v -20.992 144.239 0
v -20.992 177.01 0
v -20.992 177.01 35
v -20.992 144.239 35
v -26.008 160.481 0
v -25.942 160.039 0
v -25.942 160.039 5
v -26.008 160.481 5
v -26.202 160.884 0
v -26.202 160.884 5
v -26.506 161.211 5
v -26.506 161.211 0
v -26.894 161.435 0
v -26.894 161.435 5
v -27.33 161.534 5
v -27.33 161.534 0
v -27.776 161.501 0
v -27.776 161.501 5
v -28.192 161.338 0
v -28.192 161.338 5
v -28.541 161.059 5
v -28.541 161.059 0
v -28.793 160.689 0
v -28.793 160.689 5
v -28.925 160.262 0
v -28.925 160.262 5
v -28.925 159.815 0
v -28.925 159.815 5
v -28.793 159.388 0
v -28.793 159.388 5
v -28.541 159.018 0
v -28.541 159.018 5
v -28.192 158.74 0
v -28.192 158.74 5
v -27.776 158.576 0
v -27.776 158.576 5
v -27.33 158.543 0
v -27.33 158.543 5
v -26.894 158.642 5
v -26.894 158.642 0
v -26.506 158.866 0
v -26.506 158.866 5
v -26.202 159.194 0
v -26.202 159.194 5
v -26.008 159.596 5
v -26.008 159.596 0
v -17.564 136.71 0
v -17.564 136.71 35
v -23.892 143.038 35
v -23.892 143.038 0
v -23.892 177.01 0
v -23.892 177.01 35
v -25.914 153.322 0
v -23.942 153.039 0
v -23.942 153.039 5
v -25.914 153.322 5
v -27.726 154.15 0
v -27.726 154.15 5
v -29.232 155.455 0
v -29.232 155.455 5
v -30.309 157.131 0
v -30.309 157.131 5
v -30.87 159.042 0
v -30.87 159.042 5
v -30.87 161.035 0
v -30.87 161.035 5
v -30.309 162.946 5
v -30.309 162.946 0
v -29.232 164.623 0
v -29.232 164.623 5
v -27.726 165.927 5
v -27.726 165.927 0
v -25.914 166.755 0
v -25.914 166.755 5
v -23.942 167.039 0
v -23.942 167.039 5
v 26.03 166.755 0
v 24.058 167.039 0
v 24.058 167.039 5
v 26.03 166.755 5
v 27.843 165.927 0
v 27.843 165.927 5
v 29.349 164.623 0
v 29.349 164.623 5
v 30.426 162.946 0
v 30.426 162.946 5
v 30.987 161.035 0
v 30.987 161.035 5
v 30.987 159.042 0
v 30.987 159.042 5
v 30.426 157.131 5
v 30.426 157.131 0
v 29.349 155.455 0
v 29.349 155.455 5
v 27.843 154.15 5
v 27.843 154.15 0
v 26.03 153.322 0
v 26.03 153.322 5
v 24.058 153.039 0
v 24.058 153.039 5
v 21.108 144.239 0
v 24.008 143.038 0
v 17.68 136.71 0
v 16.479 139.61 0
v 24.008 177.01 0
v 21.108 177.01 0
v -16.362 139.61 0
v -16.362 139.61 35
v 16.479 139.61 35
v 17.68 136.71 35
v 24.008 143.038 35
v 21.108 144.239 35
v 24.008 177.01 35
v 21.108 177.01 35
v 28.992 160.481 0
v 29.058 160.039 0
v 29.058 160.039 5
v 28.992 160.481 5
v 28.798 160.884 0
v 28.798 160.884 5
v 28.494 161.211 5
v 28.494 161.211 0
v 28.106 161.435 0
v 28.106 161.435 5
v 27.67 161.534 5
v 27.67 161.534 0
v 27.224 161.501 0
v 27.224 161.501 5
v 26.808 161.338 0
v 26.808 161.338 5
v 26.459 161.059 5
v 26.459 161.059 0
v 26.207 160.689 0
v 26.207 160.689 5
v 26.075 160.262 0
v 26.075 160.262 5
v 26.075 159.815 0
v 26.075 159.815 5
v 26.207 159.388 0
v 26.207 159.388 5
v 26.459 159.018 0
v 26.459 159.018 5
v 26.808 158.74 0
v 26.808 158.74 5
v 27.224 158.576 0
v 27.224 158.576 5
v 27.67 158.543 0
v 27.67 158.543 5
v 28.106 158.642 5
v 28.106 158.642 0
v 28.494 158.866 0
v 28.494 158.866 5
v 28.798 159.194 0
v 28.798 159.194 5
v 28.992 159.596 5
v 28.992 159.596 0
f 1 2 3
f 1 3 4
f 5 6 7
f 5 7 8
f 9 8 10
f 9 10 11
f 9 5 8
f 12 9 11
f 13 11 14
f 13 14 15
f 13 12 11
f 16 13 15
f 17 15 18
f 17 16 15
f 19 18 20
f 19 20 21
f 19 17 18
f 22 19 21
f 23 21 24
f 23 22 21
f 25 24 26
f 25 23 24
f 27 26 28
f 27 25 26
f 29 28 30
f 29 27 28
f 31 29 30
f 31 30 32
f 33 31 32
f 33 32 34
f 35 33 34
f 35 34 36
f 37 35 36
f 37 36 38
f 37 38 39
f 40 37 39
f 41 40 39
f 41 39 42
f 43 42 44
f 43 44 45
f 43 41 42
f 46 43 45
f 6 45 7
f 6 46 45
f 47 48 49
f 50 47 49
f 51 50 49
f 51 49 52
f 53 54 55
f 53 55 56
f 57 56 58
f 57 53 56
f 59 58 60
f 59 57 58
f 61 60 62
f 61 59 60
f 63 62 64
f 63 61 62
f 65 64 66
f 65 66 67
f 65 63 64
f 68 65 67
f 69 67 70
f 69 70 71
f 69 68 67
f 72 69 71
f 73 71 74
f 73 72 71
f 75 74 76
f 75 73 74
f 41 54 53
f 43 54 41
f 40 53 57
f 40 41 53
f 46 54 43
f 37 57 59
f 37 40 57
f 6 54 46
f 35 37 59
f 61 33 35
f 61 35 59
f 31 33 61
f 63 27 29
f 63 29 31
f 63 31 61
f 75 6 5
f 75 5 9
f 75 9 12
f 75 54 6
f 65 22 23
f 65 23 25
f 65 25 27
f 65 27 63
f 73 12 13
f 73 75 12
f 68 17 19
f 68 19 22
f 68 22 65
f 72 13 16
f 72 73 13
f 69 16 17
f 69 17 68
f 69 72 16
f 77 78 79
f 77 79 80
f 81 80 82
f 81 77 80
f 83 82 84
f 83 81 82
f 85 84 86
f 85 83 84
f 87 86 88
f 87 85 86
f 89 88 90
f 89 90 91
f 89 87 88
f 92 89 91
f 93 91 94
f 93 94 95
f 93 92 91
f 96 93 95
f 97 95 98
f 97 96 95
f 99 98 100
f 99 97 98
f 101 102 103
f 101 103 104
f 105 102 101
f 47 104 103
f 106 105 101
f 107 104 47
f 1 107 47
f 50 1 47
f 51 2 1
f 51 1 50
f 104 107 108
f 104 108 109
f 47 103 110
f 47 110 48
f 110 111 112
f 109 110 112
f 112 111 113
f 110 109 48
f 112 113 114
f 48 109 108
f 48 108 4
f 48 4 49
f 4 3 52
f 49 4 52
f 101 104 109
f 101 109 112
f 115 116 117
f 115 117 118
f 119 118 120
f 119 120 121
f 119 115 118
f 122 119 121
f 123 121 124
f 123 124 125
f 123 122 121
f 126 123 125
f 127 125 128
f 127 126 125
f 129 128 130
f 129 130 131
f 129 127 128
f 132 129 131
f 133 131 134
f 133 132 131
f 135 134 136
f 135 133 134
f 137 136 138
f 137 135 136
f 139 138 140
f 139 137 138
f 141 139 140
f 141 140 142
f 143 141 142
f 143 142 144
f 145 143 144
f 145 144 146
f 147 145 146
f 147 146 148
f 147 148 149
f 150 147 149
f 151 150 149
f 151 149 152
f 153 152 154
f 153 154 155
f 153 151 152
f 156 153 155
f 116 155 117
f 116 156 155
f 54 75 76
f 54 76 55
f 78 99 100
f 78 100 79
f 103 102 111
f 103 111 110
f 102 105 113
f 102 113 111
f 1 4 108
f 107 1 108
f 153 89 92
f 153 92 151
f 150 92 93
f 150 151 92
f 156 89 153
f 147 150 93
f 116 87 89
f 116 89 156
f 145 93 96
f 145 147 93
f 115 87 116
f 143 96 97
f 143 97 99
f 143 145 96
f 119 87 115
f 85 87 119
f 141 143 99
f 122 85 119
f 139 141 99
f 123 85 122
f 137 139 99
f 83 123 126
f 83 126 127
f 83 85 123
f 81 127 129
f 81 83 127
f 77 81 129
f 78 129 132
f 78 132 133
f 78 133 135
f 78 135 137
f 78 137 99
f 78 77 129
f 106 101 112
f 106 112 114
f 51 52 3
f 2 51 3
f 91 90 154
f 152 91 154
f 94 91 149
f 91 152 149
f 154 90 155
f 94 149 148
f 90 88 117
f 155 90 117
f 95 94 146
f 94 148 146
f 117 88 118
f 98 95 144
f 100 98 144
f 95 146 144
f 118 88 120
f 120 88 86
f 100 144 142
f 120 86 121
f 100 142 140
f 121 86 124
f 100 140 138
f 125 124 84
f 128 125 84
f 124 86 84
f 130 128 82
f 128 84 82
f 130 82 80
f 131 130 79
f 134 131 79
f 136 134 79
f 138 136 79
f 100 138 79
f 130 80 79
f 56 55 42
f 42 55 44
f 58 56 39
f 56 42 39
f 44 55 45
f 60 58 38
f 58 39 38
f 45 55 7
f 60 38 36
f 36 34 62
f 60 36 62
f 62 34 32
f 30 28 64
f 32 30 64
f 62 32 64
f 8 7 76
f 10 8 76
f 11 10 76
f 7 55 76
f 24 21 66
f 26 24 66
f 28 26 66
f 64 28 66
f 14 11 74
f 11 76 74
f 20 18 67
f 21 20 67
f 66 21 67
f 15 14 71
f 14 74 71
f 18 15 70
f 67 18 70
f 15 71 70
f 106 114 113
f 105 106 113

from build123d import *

# Parameters (mm, degrees)
BOSS_EXTRUDE1_DEPTH   = 35
SKETCH2_R             = 1.5
BOSS_EXTRUDE2_DEPTH   = 5
BOSS_EXTRUDE2_2_DEPTH = 5


with BuildPart() as part:
    # Sketch1 → Boss-Extrude1 (new body)
    with BuildSketch(Plane.XY):
        Polygon((21.10827062, 144.239197751), (21.10827062, 177.00990843), (24.00827062, 177.00990843), (24.00827062, 143.037978421), (17.68020063, 136.70990843), (-17.563659389, 136.70990843), (-23.89172938, 143.037978421), (-23.89172938, 177.00990843), (-20.99172938, 177.00990843), (-20.99172938, 144.239197751), (-16.362440058, 139.60990843), (16.478981299, 139.60990843), align=None)
    extrude(amount=BOSS_EXTRUDE1_DEPTH)


with BuildPart() as body_2:
    # Sketch2 → Boss-Extrude2 (new body)
    with BuildSketch(Plane.XY):
        with BuildLine():
            ThreePointArc((24.05827062, 167.038588086), (31.05827062, 160.038588086), (24.05827062, 153.038588086))
            Line((24.05827062, 153.038588086), (24.05827062, 167.038588086))
        make_face()
        with Locations((27.55827062, 160.038588086)):
            Circle(SKETCH2_R, mode=Mode.SUBTRACT)
    extrude(amount=BOSS_EXTRUDE2_DEPTH)


with BuildPart() as body_3:
    # Sketch2 → Boss-Extrude2 2 (new body)
    with BuildSketch(Plane.XY):
        with BuildLine():
            Line((-23.94172938, 167.038588086), (-23.94172938, 153.038588086))
            ThreePointArc((-23.94172938, 153.038588086), (-30.94172938, 160.038588086), (-23.94172938, 167.038588086))
        make_face()
        with Locations((-27.44172938, 160.038588086)):
            Circle(SKETCH2_R, mode=Mode.SUBTRACT)
    extrude(amount=BOSS_EXTRUDE2_2_DEPTH)


solid = Compound([part.part, body_2.part, body_3.part])
